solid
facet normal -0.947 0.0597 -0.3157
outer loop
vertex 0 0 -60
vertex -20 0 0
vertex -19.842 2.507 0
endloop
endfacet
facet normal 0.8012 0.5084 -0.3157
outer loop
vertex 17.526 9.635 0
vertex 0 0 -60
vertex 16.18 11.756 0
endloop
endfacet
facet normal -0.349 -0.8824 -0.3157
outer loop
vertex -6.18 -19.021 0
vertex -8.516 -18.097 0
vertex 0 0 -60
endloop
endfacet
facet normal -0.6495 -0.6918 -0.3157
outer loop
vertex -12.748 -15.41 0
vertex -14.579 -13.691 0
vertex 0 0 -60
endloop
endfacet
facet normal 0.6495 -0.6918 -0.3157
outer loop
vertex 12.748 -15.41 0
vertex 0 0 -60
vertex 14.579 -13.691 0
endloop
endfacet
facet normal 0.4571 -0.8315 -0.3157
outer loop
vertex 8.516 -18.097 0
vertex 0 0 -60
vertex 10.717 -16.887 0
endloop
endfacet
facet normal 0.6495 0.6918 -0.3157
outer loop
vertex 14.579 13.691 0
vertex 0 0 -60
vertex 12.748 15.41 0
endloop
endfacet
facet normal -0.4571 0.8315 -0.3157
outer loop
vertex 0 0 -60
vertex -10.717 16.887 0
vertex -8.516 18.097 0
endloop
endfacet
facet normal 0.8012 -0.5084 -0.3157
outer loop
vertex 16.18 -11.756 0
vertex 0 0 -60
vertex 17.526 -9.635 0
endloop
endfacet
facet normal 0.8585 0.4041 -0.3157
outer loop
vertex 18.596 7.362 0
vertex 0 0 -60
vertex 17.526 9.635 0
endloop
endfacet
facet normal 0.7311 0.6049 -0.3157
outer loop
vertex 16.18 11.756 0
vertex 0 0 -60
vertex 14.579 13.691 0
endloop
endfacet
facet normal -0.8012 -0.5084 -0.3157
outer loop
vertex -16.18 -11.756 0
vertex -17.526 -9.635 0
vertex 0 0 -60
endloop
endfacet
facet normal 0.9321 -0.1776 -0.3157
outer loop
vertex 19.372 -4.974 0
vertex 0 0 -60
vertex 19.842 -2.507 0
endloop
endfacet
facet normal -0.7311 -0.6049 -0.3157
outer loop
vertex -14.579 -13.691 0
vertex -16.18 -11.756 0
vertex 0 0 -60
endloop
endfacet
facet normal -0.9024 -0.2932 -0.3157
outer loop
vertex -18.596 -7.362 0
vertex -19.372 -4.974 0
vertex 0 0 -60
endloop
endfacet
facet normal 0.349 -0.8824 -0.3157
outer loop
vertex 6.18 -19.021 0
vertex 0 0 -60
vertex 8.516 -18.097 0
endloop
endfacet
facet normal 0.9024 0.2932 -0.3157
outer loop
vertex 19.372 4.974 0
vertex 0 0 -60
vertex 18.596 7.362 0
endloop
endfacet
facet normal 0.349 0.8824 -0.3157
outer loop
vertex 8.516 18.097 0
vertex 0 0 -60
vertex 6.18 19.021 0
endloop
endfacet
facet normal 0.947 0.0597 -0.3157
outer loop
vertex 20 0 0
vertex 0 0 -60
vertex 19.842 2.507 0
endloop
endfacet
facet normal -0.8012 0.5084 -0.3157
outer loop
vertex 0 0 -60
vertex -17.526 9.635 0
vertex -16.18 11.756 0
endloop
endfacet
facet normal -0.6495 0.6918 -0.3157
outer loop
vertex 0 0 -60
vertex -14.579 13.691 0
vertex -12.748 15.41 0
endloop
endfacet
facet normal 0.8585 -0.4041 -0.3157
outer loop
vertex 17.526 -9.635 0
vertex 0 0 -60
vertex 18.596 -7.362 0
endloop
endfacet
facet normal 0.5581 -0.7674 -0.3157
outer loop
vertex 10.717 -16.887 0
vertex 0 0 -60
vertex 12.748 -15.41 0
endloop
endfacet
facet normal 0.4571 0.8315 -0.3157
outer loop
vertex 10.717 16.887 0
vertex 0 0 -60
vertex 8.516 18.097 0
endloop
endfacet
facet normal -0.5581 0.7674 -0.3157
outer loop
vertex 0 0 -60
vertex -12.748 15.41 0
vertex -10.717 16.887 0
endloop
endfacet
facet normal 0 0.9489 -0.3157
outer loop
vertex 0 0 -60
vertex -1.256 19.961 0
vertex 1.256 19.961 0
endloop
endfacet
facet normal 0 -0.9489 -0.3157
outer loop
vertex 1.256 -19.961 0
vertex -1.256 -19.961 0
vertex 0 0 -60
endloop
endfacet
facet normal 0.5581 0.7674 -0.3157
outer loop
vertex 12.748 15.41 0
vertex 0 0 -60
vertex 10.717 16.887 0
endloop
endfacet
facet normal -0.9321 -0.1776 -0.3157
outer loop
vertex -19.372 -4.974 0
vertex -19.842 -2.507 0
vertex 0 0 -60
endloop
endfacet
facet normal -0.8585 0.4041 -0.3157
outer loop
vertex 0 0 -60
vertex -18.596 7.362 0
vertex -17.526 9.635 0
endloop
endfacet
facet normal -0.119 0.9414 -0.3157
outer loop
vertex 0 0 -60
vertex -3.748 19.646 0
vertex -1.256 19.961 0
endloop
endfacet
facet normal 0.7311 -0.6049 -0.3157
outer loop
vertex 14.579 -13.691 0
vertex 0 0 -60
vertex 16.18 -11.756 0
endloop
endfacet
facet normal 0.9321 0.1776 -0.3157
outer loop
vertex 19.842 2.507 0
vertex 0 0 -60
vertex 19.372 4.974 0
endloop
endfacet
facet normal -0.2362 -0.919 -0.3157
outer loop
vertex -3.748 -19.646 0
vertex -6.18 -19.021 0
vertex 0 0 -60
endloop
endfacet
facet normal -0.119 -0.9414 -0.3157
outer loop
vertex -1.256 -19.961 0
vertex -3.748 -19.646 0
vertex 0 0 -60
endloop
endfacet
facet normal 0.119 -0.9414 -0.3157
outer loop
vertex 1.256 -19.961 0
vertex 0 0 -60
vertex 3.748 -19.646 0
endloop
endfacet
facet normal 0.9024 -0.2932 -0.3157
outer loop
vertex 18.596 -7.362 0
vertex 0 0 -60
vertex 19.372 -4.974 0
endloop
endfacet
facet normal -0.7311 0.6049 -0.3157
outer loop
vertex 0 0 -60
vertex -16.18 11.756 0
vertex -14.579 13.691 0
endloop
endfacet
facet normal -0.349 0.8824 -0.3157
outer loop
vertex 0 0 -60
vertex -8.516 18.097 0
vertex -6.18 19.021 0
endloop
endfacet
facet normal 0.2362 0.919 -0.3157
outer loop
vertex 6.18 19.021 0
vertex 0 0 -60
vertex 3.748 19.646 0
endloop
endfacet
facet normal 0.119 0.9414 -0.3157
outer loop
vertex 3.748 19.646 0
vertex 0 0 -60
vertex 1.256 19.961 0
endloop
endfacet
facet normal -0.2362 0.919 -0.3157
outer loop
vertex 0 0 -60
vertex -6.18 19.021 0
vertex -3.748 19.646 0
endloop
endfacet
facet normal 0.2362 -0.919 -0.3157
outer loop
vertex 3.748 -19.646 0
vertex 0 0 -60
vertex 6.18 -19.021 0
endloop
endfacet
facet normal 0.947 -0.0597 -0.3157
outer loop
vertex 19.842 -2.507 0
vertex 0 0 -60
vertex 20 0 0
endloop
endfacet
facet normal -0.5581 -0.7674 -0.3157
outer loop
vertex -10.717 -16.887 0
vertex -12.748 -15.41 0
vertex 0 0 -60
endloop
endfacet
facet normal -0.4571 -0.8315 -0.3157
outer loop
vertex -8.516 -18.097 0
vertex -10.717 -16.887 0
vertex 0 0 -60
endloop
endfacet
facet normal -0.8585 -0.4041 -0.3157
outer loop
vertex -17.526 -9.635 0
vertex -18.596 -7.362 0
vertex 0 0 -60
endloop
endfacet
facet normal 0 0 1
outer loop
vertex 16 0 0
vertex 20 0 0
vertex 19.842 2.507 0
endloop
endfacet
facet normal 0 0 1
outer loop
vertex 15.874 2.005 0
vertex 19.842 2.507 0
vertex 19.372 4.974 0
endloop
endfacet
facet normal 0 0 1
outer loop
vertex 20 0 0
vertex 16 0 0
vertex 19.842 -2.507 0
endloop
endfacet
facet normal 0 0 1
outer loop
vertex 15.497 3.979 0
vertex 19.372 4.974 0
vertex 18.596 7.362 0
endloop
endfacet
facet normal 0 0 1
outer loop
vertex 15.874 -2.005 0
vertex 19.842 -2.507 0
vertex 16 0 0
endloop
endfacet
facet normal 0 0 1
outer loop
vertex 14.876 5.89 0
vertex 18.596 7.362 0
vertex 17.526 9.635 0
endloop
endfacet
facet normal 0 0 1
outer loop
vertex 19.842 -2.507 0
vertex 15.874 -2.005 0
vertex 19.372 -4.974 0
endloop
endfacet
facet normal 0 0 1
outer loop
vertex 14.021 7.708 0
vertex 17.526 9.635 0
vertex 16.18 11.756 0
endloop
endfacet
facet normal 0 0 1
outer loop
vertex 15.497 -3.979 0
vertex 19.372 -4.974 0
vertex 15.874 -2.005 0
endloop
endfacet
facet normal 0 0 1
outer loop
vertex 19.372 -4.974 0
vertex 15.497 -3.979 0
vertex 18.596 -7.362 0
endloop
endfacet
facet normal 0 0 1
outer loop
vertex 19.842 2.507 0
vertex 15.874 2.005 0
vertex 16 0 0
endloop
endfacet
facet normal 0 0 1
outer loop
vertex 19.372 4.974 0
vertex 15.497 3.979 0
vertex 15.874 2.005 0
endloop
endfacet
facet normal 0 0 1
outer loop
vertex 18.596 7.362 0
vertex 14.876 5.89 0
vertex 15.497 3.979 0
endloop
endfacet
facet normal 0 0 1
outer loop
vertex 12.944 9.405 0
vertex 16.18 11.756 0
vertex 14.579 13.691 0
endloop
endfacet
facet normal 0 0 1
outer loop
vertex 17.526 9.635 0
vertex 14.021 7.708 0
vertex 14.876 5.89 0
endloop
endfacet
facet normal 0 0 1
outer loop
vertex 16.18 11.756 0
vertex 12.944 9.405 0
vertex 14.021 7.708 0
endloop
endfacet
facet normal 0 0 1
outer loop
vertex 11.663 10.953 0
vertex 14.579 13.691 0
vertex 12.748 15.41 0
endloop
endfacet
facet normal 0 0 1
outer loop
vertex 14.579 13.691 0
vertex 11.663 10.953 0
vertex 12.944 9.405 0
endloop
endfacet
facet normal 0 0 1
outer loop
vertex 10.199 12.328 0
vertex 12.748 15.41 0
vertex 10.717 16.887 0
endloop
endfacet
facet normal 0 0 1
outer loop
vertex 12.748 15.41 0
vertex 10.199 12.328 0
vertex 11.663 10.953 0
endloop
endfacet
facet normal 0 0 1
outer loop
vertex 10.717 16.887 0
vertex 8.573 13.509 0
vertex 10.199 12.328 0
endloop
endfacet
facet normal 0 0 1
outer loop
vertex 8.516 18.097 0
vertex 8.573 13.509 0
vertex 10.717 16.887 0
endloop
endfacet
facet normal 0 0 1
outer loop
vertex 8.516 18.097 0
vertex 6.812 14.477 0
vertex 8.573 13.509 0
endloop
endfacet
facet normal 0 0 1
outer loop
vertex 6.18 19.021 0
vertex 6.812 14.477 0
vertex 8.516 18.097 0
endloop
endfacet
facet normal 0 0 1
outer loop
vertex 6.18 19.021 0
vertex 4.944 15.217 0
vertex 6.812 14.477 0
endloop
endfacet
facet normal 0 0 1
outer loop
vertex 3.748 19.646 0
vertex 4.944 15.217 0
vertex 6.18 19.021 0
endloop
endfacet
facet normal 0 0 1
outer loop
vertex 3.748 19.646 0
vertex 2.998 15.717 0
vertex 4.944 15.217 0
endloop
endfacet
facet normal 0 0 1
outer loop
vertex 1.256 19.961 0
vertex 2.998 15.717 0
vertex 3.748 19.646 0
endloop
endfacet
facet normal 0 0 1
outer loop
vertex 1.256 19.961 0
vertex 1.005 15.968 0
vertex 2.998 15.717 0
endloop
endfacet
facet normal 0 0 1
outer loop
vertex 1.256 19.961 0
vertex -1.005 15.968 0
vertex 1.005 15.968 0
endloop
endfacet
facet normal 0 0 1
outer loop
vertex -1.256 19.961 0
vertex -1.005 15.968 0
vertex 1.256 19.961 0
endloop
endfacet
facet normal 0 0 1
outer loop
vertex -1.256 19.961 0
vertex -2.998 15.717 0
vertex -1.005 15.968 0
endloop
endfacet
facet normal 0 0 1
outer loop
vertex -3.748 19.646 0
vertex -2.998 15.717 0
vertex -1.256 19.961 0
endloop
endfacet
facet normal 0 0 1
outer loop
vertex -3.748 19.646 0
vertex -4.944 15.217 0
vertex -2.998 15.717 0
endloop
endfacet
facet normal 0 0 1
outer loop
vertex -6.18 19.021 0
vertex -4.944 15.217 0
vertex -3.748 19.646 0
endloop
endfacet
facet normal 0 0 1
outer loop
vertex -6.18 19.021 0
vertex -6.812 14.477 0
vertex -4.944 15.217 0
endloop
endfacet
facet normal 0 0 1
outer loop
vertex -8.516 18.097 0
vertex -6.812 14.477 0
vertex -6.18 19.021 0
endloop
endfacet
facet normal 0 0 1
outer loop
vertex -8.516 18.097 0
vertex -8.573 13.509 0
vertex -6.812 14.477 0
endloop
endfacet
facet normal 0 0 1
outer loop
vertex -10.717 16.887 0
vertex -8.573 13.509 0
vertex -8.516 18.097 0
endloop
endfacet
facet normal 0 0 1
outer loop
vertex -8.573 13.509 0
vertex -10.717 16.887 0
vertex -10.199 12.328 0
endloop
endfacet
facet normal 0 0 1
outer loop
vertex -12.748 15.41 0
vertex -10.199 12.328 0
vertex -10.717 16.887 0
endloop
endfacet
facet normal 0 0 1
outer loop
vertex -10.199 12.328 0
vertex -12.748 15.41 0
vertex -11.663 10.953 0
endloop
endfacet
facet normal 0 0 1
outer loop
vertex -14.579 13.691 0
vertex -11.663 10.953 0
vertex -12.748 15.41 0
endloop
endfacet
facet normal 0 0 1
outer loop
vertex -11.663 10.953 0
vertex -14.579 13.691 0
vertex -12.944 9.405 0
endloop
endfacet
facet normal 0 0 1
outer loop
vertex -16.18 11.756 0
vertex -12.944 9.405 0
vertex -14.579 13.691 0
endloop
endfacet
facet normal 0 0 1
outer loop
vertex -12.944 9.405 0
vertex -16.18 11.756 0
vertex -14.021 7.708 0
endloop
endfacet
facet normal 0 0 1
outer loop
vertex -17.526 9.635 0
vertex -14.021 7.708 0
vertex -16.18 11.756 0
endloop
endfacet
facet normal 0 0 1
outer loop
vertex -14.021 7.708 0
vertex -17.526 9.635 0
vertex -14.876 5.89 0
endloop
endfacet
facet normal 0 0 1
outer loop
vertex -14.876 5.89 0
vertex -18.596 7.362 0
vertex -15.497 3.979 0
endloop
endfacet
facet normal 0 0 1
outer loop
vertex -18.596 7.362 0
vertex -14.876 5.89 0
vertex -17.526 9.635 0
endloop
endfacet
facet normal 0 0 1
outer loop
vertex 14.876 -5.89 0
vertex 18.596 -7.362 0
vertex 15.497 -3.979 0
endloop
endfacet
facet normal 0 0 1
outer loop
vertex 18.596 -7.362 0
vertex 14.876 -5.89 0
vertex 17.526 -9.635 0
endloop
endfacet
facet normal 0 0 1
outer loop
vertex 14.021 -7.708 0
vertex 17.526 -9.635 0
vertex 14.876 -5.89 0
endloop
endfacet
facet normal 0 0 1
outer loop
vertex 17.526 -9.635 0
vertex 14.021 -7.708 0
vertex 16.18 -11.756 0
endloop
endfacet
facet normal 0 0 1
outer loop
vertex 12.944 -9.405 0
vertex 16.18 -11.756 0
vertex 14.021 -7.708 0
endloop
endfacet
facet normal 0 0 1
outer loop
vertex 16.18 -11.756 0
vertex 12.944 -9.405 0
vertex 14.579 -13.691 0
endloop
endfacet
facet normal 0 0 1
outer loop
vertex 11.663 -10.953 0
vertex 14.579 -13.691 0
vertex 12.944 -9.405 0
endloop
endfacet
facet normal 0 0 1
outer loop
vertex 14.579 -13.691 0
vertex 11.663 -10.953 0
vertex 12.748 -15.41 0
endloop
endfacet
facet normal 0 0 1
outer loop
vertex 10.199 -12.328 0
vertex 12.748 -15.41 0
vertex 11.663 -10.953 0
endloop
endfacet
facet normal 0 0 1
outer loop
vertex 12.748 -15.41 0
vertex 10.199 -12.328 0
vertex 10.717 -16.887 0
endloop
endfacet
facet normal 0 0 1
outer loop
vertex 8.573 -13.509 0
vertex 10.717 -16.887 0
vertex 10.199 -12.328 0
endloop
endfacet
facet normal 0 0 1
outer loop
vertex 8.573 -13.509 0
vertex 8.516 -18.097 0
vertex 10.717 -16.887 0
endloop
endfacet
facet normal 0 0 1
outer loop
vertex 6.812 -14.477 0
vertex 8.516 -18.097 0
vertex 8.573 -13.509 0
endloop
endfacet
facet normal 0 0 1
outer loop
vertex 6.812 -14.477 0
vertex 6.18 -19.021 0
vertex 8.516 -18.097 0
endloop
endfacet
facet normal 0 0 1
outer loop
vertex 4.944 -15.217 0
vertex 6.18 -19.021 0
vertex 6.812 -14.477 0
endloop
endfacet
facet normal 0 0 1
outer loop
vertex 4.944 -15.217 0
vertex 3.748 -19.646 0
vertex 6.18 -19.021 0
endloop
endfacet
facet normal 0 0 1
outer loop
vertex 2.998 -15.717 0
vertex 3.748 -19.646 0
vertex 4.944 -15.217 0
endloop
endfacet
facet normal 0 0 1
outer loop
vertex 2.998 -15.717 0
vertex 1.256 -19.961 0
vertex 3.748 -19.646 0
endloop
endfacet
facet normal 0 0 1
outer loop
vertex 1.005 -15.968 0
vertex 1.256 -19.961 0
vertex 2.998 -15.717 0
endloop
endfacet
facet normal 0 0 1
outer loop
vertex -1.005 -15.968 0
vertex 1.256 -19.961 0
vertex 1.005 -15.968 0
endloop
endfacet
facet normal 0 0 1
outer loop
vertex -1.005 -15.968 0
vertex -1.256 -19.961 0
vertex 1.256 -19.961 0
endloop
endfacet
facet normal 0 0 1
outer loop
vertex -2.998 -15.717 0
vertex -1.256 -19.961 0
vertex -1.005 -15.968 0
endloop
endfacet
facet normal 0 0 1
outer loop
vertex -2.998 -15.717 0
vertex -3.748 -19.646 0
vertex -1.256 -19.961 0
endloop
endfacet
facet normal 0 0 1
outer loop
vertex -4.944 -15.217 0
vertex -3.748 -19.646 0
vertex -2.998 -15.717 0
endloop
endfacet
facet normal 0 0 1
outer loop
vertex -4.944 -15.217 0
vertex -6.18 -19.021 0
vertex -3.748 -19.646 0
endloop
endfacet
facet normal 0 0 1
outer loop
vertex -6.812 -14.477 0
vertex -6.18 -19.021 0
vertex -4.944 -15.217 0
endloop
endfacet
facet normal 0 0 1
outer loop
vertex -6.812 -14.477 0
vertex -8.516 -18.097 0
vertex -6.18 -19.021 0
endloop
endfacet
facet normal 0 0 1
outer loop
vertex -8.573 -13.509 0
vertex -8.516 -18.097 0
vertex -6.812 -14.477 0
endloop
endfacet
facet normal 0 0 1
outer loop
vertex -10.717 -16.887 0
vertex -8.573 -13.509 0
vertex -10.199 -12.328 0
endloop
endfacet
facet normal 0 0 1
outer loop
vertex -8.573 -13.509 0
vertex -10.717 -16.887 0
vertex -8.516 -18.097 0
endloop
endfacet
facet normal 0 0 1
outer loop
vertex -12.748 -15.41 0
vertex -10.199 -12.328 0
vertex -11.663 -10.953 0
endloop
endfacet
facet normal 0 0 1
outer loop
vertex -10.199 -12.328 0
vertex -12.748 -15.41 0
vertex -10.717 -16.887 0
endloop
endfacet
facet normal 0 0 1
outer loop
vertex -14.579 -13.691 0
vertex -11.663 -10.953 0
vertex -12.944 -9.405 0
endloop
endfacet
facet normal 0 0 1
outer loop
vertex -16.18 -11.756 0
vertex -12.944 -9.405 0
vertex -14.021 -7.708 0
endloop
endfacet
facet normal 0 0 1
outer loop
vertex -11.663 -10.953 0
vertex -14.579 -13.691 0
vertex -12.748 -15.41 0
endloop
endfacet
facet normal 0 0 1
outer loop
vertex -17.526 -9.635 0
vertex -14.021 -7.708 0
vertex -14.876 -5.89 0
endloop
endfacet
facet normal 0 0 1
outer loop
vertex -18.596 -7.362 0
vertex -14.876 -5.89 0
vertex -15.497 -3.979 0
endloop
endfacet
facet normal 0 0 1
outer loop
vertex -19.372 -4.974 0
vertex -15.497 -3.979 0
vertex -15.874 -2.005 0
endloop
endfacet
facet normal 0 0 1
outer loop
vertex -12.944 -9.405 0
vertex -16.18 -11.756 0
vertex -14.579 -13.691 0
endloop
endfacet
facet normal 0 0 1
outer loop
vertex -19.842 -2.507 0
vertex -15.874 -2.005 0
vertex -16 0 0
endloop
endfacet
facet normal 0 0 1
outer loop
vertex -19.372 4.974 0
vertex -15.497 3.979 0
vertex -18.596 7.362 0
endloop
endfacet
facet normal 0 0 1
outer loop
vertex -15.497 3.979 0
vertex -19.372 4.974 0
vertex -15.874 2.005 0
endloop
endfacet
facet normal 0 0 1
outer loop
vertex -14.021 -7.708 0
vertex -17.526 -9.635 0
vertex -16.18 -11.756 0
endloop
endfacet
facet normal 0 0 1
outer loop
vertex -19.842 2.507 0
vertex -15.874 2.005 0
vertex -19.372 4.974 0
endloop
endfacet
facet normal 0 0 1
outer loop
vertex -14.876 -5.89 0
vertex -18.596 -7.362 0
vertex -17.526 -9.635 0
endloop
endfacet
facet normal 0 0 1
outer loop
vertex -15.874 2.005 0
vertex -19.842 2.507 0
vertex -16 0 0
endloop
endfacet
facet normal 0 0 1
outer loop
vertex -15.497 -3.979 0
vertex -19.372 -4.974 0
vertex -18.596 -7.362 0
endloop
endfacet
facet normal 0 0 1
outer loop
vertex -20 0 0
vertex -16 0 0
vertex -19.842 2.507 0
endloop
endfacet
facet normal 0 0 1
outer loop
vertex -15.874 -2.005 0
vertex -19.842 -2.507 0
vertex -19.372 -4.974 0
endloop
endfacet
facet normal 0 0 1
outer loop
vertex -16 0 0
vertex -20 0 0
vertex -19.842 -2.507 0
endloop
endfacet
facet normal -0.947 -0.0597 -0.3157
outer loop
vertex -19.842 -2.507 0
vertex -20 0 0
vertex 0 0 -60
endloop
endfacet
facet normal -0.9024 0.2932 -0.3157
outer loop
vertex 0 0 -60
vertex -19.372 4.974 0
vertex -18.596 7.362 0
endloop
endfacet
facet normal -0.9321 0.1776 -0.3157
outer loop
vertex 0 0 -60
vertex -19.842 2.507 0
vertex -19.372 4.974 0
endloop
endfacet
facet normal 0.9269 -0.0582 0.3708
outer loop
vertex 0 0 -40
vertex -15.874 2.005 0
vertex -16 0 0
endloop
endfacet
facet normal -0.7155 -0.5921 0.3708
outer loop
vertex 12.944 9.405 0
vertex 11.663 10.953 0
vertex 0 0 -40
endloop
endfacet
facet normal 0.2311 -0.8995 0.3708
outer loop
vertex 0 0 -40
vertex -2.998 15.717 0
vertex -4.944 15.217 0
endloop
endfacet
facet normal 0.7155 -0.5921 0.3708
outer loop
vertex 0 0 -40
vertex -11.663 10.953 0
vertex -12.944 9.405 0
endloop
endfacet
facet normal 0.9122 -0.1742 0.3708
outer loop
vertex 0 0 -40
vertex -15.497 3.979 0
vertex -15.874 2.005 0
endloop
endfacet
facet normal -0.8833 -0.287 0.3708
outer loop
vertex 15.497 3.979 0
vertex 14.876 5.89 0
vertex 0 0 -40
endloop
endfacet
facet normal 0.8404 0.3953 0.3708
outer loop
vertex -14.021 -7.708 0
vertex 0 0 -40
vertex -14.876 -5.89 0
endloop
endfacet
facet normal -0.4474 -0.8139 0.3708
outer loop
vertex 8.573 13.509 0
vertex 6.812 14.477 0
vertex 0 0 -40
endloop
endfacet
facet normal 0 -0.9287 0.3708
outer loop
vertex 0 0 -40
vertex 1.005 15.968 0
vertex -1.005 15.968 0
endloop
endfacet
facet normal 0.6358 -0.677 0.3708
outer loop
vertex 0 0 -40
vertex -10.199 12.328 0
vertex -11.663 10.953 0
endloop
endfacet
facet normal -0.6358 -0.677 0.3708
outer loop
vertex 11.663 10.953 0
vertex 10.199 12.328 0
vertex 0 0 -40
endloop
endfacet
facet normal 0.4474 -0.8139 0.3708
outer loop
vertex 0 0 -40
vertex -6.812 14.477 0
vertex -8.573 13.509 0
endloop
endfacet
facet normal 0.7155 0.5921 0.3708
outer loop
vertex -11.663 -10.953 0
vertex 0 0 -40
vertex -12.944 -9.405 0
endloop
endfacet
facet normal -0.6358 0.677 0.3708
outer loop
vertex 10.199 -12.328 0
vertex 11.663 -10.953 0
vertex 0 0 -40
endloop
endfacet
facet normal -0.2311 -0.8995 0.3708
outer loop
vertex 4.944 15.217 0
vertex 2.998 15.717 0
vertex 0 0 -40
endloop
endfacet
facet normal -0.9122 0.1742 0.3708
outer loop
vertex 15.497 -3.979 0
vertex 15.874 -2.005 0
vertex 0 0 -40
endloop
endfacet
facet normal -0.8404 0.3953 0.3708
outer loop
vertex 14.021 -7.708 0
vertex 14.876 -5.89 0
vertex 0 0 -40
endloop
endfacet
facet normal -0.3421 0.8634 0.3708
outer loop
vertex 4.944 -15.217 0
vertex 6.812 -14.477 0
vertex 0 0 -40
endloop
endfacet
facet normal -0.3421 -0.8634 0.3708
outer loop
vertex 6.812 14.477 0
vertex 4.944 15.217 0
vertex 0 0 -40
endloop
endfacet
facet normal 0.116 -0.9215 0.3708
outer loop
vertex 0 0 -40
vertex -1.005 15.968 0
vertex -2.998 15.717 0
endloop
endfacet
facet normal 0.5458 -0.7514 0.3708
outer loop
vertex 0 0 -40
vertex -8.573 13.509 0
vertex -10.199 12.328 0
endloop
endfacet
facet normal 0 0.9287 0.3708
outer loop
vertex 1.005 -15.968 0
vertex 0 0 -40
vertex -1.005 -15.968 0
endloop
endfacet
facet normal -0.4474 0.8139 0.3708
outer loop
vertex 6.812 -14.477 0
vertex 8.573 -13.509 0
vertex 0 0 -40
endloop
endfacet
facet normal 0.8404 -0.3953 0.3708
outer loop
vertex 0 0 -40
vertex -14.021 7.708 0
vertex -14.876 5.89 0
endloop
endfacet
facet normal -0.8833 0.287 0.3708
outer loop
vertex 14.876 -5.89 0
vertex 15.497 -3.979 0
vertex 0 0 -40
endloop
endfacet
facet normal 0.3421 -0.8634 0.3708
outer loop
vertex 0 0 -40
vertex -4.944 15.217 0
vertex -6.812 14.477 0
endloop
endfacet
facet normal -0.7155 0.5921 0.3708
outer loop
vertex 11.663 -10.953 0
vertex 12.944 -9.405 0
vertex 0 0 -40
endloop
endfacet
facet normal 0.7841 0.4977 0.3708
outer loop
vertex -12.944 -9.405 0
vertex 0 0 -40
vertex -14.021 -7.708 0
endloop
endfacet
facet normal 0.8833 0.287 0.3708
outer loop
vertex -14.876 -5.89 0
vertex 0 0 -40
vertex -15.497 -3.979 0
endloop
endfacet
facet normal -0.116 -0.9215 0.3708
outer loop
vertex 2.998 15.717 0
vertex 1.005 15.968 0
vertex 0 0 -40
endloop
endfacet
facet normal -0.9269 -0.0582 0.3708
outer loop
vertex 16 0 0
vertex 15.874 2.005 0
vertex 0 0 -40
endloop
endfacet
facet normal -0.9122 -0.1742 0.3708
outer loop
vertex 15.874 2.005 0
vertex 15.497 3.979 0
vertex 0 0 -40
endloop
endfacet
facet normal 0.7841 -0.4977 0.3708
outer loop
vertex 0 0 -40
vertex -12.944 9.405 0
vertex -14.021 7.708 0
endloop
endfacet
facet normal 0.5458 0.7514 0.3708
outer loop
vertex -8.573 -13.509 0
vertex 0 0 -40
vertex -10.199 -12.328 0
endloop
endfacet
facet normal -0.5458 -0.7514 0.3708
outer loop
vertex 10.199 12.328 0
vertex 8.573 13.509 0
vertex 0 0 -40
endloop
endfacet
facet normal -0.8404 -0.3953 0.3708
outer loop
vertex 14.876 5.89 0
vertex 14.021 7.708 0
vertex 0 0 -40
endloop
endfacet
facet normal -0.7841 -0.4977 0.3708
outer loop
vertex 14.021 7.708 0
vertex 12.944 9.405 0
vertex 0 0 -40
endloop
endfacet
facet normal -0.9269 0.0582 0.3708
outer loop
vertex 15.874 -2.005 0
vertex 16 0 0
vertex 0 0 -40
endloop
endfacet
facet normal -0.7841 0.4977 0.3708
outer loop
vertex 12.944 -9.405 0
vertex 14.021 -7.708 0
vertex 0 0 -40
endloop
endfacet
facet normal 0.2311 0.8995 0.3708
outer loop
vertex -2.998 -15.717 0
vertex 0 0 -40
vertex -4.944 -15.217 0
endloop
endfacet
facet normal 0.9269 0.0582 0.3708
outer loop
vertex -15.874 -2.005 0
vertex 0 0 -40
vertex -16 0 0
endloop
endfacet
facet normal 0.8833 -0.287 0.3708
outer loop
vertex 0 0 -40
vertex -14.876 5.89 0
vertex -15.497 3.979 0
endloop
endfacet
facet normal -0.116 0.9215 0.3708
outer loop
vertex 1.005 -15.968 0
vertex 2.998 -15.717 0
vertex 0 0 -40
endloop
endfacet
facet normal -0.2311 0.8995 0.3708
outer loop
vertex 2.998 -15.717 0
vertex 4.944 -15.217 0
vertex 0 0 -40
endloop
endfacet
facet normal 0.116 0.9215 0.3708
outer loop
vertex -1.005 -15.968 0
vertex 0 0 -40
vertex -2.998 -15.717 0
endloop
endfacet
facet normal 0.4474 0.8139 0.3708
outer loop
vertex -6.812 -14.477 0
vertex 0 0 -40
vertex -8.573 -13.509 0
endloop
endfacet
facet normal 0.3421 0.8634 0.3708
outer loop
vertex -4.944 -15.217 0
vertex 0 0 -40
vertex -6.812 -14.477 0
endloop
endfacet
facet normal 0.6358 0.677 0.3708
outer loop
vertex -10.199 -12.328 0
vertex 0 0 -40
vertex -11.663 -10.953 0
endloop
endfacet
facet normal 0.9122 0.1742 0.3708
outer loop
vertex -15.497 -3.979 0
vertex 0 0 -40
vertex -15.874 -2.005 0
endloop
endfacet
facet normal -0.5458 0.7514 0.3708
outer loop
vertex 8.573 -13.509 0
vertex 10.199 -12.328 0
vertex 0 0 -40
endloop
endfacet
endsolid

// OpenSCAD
difference(){
color("yellow") rotate([0,-180,0])cylinder(h=60, r1=20, r2=0, $fn=50);
color("green") translate([0,0,10]) rotate([0,-180,0])cylinder(h=50, r1=20, r2=0, $fn=50);
}
